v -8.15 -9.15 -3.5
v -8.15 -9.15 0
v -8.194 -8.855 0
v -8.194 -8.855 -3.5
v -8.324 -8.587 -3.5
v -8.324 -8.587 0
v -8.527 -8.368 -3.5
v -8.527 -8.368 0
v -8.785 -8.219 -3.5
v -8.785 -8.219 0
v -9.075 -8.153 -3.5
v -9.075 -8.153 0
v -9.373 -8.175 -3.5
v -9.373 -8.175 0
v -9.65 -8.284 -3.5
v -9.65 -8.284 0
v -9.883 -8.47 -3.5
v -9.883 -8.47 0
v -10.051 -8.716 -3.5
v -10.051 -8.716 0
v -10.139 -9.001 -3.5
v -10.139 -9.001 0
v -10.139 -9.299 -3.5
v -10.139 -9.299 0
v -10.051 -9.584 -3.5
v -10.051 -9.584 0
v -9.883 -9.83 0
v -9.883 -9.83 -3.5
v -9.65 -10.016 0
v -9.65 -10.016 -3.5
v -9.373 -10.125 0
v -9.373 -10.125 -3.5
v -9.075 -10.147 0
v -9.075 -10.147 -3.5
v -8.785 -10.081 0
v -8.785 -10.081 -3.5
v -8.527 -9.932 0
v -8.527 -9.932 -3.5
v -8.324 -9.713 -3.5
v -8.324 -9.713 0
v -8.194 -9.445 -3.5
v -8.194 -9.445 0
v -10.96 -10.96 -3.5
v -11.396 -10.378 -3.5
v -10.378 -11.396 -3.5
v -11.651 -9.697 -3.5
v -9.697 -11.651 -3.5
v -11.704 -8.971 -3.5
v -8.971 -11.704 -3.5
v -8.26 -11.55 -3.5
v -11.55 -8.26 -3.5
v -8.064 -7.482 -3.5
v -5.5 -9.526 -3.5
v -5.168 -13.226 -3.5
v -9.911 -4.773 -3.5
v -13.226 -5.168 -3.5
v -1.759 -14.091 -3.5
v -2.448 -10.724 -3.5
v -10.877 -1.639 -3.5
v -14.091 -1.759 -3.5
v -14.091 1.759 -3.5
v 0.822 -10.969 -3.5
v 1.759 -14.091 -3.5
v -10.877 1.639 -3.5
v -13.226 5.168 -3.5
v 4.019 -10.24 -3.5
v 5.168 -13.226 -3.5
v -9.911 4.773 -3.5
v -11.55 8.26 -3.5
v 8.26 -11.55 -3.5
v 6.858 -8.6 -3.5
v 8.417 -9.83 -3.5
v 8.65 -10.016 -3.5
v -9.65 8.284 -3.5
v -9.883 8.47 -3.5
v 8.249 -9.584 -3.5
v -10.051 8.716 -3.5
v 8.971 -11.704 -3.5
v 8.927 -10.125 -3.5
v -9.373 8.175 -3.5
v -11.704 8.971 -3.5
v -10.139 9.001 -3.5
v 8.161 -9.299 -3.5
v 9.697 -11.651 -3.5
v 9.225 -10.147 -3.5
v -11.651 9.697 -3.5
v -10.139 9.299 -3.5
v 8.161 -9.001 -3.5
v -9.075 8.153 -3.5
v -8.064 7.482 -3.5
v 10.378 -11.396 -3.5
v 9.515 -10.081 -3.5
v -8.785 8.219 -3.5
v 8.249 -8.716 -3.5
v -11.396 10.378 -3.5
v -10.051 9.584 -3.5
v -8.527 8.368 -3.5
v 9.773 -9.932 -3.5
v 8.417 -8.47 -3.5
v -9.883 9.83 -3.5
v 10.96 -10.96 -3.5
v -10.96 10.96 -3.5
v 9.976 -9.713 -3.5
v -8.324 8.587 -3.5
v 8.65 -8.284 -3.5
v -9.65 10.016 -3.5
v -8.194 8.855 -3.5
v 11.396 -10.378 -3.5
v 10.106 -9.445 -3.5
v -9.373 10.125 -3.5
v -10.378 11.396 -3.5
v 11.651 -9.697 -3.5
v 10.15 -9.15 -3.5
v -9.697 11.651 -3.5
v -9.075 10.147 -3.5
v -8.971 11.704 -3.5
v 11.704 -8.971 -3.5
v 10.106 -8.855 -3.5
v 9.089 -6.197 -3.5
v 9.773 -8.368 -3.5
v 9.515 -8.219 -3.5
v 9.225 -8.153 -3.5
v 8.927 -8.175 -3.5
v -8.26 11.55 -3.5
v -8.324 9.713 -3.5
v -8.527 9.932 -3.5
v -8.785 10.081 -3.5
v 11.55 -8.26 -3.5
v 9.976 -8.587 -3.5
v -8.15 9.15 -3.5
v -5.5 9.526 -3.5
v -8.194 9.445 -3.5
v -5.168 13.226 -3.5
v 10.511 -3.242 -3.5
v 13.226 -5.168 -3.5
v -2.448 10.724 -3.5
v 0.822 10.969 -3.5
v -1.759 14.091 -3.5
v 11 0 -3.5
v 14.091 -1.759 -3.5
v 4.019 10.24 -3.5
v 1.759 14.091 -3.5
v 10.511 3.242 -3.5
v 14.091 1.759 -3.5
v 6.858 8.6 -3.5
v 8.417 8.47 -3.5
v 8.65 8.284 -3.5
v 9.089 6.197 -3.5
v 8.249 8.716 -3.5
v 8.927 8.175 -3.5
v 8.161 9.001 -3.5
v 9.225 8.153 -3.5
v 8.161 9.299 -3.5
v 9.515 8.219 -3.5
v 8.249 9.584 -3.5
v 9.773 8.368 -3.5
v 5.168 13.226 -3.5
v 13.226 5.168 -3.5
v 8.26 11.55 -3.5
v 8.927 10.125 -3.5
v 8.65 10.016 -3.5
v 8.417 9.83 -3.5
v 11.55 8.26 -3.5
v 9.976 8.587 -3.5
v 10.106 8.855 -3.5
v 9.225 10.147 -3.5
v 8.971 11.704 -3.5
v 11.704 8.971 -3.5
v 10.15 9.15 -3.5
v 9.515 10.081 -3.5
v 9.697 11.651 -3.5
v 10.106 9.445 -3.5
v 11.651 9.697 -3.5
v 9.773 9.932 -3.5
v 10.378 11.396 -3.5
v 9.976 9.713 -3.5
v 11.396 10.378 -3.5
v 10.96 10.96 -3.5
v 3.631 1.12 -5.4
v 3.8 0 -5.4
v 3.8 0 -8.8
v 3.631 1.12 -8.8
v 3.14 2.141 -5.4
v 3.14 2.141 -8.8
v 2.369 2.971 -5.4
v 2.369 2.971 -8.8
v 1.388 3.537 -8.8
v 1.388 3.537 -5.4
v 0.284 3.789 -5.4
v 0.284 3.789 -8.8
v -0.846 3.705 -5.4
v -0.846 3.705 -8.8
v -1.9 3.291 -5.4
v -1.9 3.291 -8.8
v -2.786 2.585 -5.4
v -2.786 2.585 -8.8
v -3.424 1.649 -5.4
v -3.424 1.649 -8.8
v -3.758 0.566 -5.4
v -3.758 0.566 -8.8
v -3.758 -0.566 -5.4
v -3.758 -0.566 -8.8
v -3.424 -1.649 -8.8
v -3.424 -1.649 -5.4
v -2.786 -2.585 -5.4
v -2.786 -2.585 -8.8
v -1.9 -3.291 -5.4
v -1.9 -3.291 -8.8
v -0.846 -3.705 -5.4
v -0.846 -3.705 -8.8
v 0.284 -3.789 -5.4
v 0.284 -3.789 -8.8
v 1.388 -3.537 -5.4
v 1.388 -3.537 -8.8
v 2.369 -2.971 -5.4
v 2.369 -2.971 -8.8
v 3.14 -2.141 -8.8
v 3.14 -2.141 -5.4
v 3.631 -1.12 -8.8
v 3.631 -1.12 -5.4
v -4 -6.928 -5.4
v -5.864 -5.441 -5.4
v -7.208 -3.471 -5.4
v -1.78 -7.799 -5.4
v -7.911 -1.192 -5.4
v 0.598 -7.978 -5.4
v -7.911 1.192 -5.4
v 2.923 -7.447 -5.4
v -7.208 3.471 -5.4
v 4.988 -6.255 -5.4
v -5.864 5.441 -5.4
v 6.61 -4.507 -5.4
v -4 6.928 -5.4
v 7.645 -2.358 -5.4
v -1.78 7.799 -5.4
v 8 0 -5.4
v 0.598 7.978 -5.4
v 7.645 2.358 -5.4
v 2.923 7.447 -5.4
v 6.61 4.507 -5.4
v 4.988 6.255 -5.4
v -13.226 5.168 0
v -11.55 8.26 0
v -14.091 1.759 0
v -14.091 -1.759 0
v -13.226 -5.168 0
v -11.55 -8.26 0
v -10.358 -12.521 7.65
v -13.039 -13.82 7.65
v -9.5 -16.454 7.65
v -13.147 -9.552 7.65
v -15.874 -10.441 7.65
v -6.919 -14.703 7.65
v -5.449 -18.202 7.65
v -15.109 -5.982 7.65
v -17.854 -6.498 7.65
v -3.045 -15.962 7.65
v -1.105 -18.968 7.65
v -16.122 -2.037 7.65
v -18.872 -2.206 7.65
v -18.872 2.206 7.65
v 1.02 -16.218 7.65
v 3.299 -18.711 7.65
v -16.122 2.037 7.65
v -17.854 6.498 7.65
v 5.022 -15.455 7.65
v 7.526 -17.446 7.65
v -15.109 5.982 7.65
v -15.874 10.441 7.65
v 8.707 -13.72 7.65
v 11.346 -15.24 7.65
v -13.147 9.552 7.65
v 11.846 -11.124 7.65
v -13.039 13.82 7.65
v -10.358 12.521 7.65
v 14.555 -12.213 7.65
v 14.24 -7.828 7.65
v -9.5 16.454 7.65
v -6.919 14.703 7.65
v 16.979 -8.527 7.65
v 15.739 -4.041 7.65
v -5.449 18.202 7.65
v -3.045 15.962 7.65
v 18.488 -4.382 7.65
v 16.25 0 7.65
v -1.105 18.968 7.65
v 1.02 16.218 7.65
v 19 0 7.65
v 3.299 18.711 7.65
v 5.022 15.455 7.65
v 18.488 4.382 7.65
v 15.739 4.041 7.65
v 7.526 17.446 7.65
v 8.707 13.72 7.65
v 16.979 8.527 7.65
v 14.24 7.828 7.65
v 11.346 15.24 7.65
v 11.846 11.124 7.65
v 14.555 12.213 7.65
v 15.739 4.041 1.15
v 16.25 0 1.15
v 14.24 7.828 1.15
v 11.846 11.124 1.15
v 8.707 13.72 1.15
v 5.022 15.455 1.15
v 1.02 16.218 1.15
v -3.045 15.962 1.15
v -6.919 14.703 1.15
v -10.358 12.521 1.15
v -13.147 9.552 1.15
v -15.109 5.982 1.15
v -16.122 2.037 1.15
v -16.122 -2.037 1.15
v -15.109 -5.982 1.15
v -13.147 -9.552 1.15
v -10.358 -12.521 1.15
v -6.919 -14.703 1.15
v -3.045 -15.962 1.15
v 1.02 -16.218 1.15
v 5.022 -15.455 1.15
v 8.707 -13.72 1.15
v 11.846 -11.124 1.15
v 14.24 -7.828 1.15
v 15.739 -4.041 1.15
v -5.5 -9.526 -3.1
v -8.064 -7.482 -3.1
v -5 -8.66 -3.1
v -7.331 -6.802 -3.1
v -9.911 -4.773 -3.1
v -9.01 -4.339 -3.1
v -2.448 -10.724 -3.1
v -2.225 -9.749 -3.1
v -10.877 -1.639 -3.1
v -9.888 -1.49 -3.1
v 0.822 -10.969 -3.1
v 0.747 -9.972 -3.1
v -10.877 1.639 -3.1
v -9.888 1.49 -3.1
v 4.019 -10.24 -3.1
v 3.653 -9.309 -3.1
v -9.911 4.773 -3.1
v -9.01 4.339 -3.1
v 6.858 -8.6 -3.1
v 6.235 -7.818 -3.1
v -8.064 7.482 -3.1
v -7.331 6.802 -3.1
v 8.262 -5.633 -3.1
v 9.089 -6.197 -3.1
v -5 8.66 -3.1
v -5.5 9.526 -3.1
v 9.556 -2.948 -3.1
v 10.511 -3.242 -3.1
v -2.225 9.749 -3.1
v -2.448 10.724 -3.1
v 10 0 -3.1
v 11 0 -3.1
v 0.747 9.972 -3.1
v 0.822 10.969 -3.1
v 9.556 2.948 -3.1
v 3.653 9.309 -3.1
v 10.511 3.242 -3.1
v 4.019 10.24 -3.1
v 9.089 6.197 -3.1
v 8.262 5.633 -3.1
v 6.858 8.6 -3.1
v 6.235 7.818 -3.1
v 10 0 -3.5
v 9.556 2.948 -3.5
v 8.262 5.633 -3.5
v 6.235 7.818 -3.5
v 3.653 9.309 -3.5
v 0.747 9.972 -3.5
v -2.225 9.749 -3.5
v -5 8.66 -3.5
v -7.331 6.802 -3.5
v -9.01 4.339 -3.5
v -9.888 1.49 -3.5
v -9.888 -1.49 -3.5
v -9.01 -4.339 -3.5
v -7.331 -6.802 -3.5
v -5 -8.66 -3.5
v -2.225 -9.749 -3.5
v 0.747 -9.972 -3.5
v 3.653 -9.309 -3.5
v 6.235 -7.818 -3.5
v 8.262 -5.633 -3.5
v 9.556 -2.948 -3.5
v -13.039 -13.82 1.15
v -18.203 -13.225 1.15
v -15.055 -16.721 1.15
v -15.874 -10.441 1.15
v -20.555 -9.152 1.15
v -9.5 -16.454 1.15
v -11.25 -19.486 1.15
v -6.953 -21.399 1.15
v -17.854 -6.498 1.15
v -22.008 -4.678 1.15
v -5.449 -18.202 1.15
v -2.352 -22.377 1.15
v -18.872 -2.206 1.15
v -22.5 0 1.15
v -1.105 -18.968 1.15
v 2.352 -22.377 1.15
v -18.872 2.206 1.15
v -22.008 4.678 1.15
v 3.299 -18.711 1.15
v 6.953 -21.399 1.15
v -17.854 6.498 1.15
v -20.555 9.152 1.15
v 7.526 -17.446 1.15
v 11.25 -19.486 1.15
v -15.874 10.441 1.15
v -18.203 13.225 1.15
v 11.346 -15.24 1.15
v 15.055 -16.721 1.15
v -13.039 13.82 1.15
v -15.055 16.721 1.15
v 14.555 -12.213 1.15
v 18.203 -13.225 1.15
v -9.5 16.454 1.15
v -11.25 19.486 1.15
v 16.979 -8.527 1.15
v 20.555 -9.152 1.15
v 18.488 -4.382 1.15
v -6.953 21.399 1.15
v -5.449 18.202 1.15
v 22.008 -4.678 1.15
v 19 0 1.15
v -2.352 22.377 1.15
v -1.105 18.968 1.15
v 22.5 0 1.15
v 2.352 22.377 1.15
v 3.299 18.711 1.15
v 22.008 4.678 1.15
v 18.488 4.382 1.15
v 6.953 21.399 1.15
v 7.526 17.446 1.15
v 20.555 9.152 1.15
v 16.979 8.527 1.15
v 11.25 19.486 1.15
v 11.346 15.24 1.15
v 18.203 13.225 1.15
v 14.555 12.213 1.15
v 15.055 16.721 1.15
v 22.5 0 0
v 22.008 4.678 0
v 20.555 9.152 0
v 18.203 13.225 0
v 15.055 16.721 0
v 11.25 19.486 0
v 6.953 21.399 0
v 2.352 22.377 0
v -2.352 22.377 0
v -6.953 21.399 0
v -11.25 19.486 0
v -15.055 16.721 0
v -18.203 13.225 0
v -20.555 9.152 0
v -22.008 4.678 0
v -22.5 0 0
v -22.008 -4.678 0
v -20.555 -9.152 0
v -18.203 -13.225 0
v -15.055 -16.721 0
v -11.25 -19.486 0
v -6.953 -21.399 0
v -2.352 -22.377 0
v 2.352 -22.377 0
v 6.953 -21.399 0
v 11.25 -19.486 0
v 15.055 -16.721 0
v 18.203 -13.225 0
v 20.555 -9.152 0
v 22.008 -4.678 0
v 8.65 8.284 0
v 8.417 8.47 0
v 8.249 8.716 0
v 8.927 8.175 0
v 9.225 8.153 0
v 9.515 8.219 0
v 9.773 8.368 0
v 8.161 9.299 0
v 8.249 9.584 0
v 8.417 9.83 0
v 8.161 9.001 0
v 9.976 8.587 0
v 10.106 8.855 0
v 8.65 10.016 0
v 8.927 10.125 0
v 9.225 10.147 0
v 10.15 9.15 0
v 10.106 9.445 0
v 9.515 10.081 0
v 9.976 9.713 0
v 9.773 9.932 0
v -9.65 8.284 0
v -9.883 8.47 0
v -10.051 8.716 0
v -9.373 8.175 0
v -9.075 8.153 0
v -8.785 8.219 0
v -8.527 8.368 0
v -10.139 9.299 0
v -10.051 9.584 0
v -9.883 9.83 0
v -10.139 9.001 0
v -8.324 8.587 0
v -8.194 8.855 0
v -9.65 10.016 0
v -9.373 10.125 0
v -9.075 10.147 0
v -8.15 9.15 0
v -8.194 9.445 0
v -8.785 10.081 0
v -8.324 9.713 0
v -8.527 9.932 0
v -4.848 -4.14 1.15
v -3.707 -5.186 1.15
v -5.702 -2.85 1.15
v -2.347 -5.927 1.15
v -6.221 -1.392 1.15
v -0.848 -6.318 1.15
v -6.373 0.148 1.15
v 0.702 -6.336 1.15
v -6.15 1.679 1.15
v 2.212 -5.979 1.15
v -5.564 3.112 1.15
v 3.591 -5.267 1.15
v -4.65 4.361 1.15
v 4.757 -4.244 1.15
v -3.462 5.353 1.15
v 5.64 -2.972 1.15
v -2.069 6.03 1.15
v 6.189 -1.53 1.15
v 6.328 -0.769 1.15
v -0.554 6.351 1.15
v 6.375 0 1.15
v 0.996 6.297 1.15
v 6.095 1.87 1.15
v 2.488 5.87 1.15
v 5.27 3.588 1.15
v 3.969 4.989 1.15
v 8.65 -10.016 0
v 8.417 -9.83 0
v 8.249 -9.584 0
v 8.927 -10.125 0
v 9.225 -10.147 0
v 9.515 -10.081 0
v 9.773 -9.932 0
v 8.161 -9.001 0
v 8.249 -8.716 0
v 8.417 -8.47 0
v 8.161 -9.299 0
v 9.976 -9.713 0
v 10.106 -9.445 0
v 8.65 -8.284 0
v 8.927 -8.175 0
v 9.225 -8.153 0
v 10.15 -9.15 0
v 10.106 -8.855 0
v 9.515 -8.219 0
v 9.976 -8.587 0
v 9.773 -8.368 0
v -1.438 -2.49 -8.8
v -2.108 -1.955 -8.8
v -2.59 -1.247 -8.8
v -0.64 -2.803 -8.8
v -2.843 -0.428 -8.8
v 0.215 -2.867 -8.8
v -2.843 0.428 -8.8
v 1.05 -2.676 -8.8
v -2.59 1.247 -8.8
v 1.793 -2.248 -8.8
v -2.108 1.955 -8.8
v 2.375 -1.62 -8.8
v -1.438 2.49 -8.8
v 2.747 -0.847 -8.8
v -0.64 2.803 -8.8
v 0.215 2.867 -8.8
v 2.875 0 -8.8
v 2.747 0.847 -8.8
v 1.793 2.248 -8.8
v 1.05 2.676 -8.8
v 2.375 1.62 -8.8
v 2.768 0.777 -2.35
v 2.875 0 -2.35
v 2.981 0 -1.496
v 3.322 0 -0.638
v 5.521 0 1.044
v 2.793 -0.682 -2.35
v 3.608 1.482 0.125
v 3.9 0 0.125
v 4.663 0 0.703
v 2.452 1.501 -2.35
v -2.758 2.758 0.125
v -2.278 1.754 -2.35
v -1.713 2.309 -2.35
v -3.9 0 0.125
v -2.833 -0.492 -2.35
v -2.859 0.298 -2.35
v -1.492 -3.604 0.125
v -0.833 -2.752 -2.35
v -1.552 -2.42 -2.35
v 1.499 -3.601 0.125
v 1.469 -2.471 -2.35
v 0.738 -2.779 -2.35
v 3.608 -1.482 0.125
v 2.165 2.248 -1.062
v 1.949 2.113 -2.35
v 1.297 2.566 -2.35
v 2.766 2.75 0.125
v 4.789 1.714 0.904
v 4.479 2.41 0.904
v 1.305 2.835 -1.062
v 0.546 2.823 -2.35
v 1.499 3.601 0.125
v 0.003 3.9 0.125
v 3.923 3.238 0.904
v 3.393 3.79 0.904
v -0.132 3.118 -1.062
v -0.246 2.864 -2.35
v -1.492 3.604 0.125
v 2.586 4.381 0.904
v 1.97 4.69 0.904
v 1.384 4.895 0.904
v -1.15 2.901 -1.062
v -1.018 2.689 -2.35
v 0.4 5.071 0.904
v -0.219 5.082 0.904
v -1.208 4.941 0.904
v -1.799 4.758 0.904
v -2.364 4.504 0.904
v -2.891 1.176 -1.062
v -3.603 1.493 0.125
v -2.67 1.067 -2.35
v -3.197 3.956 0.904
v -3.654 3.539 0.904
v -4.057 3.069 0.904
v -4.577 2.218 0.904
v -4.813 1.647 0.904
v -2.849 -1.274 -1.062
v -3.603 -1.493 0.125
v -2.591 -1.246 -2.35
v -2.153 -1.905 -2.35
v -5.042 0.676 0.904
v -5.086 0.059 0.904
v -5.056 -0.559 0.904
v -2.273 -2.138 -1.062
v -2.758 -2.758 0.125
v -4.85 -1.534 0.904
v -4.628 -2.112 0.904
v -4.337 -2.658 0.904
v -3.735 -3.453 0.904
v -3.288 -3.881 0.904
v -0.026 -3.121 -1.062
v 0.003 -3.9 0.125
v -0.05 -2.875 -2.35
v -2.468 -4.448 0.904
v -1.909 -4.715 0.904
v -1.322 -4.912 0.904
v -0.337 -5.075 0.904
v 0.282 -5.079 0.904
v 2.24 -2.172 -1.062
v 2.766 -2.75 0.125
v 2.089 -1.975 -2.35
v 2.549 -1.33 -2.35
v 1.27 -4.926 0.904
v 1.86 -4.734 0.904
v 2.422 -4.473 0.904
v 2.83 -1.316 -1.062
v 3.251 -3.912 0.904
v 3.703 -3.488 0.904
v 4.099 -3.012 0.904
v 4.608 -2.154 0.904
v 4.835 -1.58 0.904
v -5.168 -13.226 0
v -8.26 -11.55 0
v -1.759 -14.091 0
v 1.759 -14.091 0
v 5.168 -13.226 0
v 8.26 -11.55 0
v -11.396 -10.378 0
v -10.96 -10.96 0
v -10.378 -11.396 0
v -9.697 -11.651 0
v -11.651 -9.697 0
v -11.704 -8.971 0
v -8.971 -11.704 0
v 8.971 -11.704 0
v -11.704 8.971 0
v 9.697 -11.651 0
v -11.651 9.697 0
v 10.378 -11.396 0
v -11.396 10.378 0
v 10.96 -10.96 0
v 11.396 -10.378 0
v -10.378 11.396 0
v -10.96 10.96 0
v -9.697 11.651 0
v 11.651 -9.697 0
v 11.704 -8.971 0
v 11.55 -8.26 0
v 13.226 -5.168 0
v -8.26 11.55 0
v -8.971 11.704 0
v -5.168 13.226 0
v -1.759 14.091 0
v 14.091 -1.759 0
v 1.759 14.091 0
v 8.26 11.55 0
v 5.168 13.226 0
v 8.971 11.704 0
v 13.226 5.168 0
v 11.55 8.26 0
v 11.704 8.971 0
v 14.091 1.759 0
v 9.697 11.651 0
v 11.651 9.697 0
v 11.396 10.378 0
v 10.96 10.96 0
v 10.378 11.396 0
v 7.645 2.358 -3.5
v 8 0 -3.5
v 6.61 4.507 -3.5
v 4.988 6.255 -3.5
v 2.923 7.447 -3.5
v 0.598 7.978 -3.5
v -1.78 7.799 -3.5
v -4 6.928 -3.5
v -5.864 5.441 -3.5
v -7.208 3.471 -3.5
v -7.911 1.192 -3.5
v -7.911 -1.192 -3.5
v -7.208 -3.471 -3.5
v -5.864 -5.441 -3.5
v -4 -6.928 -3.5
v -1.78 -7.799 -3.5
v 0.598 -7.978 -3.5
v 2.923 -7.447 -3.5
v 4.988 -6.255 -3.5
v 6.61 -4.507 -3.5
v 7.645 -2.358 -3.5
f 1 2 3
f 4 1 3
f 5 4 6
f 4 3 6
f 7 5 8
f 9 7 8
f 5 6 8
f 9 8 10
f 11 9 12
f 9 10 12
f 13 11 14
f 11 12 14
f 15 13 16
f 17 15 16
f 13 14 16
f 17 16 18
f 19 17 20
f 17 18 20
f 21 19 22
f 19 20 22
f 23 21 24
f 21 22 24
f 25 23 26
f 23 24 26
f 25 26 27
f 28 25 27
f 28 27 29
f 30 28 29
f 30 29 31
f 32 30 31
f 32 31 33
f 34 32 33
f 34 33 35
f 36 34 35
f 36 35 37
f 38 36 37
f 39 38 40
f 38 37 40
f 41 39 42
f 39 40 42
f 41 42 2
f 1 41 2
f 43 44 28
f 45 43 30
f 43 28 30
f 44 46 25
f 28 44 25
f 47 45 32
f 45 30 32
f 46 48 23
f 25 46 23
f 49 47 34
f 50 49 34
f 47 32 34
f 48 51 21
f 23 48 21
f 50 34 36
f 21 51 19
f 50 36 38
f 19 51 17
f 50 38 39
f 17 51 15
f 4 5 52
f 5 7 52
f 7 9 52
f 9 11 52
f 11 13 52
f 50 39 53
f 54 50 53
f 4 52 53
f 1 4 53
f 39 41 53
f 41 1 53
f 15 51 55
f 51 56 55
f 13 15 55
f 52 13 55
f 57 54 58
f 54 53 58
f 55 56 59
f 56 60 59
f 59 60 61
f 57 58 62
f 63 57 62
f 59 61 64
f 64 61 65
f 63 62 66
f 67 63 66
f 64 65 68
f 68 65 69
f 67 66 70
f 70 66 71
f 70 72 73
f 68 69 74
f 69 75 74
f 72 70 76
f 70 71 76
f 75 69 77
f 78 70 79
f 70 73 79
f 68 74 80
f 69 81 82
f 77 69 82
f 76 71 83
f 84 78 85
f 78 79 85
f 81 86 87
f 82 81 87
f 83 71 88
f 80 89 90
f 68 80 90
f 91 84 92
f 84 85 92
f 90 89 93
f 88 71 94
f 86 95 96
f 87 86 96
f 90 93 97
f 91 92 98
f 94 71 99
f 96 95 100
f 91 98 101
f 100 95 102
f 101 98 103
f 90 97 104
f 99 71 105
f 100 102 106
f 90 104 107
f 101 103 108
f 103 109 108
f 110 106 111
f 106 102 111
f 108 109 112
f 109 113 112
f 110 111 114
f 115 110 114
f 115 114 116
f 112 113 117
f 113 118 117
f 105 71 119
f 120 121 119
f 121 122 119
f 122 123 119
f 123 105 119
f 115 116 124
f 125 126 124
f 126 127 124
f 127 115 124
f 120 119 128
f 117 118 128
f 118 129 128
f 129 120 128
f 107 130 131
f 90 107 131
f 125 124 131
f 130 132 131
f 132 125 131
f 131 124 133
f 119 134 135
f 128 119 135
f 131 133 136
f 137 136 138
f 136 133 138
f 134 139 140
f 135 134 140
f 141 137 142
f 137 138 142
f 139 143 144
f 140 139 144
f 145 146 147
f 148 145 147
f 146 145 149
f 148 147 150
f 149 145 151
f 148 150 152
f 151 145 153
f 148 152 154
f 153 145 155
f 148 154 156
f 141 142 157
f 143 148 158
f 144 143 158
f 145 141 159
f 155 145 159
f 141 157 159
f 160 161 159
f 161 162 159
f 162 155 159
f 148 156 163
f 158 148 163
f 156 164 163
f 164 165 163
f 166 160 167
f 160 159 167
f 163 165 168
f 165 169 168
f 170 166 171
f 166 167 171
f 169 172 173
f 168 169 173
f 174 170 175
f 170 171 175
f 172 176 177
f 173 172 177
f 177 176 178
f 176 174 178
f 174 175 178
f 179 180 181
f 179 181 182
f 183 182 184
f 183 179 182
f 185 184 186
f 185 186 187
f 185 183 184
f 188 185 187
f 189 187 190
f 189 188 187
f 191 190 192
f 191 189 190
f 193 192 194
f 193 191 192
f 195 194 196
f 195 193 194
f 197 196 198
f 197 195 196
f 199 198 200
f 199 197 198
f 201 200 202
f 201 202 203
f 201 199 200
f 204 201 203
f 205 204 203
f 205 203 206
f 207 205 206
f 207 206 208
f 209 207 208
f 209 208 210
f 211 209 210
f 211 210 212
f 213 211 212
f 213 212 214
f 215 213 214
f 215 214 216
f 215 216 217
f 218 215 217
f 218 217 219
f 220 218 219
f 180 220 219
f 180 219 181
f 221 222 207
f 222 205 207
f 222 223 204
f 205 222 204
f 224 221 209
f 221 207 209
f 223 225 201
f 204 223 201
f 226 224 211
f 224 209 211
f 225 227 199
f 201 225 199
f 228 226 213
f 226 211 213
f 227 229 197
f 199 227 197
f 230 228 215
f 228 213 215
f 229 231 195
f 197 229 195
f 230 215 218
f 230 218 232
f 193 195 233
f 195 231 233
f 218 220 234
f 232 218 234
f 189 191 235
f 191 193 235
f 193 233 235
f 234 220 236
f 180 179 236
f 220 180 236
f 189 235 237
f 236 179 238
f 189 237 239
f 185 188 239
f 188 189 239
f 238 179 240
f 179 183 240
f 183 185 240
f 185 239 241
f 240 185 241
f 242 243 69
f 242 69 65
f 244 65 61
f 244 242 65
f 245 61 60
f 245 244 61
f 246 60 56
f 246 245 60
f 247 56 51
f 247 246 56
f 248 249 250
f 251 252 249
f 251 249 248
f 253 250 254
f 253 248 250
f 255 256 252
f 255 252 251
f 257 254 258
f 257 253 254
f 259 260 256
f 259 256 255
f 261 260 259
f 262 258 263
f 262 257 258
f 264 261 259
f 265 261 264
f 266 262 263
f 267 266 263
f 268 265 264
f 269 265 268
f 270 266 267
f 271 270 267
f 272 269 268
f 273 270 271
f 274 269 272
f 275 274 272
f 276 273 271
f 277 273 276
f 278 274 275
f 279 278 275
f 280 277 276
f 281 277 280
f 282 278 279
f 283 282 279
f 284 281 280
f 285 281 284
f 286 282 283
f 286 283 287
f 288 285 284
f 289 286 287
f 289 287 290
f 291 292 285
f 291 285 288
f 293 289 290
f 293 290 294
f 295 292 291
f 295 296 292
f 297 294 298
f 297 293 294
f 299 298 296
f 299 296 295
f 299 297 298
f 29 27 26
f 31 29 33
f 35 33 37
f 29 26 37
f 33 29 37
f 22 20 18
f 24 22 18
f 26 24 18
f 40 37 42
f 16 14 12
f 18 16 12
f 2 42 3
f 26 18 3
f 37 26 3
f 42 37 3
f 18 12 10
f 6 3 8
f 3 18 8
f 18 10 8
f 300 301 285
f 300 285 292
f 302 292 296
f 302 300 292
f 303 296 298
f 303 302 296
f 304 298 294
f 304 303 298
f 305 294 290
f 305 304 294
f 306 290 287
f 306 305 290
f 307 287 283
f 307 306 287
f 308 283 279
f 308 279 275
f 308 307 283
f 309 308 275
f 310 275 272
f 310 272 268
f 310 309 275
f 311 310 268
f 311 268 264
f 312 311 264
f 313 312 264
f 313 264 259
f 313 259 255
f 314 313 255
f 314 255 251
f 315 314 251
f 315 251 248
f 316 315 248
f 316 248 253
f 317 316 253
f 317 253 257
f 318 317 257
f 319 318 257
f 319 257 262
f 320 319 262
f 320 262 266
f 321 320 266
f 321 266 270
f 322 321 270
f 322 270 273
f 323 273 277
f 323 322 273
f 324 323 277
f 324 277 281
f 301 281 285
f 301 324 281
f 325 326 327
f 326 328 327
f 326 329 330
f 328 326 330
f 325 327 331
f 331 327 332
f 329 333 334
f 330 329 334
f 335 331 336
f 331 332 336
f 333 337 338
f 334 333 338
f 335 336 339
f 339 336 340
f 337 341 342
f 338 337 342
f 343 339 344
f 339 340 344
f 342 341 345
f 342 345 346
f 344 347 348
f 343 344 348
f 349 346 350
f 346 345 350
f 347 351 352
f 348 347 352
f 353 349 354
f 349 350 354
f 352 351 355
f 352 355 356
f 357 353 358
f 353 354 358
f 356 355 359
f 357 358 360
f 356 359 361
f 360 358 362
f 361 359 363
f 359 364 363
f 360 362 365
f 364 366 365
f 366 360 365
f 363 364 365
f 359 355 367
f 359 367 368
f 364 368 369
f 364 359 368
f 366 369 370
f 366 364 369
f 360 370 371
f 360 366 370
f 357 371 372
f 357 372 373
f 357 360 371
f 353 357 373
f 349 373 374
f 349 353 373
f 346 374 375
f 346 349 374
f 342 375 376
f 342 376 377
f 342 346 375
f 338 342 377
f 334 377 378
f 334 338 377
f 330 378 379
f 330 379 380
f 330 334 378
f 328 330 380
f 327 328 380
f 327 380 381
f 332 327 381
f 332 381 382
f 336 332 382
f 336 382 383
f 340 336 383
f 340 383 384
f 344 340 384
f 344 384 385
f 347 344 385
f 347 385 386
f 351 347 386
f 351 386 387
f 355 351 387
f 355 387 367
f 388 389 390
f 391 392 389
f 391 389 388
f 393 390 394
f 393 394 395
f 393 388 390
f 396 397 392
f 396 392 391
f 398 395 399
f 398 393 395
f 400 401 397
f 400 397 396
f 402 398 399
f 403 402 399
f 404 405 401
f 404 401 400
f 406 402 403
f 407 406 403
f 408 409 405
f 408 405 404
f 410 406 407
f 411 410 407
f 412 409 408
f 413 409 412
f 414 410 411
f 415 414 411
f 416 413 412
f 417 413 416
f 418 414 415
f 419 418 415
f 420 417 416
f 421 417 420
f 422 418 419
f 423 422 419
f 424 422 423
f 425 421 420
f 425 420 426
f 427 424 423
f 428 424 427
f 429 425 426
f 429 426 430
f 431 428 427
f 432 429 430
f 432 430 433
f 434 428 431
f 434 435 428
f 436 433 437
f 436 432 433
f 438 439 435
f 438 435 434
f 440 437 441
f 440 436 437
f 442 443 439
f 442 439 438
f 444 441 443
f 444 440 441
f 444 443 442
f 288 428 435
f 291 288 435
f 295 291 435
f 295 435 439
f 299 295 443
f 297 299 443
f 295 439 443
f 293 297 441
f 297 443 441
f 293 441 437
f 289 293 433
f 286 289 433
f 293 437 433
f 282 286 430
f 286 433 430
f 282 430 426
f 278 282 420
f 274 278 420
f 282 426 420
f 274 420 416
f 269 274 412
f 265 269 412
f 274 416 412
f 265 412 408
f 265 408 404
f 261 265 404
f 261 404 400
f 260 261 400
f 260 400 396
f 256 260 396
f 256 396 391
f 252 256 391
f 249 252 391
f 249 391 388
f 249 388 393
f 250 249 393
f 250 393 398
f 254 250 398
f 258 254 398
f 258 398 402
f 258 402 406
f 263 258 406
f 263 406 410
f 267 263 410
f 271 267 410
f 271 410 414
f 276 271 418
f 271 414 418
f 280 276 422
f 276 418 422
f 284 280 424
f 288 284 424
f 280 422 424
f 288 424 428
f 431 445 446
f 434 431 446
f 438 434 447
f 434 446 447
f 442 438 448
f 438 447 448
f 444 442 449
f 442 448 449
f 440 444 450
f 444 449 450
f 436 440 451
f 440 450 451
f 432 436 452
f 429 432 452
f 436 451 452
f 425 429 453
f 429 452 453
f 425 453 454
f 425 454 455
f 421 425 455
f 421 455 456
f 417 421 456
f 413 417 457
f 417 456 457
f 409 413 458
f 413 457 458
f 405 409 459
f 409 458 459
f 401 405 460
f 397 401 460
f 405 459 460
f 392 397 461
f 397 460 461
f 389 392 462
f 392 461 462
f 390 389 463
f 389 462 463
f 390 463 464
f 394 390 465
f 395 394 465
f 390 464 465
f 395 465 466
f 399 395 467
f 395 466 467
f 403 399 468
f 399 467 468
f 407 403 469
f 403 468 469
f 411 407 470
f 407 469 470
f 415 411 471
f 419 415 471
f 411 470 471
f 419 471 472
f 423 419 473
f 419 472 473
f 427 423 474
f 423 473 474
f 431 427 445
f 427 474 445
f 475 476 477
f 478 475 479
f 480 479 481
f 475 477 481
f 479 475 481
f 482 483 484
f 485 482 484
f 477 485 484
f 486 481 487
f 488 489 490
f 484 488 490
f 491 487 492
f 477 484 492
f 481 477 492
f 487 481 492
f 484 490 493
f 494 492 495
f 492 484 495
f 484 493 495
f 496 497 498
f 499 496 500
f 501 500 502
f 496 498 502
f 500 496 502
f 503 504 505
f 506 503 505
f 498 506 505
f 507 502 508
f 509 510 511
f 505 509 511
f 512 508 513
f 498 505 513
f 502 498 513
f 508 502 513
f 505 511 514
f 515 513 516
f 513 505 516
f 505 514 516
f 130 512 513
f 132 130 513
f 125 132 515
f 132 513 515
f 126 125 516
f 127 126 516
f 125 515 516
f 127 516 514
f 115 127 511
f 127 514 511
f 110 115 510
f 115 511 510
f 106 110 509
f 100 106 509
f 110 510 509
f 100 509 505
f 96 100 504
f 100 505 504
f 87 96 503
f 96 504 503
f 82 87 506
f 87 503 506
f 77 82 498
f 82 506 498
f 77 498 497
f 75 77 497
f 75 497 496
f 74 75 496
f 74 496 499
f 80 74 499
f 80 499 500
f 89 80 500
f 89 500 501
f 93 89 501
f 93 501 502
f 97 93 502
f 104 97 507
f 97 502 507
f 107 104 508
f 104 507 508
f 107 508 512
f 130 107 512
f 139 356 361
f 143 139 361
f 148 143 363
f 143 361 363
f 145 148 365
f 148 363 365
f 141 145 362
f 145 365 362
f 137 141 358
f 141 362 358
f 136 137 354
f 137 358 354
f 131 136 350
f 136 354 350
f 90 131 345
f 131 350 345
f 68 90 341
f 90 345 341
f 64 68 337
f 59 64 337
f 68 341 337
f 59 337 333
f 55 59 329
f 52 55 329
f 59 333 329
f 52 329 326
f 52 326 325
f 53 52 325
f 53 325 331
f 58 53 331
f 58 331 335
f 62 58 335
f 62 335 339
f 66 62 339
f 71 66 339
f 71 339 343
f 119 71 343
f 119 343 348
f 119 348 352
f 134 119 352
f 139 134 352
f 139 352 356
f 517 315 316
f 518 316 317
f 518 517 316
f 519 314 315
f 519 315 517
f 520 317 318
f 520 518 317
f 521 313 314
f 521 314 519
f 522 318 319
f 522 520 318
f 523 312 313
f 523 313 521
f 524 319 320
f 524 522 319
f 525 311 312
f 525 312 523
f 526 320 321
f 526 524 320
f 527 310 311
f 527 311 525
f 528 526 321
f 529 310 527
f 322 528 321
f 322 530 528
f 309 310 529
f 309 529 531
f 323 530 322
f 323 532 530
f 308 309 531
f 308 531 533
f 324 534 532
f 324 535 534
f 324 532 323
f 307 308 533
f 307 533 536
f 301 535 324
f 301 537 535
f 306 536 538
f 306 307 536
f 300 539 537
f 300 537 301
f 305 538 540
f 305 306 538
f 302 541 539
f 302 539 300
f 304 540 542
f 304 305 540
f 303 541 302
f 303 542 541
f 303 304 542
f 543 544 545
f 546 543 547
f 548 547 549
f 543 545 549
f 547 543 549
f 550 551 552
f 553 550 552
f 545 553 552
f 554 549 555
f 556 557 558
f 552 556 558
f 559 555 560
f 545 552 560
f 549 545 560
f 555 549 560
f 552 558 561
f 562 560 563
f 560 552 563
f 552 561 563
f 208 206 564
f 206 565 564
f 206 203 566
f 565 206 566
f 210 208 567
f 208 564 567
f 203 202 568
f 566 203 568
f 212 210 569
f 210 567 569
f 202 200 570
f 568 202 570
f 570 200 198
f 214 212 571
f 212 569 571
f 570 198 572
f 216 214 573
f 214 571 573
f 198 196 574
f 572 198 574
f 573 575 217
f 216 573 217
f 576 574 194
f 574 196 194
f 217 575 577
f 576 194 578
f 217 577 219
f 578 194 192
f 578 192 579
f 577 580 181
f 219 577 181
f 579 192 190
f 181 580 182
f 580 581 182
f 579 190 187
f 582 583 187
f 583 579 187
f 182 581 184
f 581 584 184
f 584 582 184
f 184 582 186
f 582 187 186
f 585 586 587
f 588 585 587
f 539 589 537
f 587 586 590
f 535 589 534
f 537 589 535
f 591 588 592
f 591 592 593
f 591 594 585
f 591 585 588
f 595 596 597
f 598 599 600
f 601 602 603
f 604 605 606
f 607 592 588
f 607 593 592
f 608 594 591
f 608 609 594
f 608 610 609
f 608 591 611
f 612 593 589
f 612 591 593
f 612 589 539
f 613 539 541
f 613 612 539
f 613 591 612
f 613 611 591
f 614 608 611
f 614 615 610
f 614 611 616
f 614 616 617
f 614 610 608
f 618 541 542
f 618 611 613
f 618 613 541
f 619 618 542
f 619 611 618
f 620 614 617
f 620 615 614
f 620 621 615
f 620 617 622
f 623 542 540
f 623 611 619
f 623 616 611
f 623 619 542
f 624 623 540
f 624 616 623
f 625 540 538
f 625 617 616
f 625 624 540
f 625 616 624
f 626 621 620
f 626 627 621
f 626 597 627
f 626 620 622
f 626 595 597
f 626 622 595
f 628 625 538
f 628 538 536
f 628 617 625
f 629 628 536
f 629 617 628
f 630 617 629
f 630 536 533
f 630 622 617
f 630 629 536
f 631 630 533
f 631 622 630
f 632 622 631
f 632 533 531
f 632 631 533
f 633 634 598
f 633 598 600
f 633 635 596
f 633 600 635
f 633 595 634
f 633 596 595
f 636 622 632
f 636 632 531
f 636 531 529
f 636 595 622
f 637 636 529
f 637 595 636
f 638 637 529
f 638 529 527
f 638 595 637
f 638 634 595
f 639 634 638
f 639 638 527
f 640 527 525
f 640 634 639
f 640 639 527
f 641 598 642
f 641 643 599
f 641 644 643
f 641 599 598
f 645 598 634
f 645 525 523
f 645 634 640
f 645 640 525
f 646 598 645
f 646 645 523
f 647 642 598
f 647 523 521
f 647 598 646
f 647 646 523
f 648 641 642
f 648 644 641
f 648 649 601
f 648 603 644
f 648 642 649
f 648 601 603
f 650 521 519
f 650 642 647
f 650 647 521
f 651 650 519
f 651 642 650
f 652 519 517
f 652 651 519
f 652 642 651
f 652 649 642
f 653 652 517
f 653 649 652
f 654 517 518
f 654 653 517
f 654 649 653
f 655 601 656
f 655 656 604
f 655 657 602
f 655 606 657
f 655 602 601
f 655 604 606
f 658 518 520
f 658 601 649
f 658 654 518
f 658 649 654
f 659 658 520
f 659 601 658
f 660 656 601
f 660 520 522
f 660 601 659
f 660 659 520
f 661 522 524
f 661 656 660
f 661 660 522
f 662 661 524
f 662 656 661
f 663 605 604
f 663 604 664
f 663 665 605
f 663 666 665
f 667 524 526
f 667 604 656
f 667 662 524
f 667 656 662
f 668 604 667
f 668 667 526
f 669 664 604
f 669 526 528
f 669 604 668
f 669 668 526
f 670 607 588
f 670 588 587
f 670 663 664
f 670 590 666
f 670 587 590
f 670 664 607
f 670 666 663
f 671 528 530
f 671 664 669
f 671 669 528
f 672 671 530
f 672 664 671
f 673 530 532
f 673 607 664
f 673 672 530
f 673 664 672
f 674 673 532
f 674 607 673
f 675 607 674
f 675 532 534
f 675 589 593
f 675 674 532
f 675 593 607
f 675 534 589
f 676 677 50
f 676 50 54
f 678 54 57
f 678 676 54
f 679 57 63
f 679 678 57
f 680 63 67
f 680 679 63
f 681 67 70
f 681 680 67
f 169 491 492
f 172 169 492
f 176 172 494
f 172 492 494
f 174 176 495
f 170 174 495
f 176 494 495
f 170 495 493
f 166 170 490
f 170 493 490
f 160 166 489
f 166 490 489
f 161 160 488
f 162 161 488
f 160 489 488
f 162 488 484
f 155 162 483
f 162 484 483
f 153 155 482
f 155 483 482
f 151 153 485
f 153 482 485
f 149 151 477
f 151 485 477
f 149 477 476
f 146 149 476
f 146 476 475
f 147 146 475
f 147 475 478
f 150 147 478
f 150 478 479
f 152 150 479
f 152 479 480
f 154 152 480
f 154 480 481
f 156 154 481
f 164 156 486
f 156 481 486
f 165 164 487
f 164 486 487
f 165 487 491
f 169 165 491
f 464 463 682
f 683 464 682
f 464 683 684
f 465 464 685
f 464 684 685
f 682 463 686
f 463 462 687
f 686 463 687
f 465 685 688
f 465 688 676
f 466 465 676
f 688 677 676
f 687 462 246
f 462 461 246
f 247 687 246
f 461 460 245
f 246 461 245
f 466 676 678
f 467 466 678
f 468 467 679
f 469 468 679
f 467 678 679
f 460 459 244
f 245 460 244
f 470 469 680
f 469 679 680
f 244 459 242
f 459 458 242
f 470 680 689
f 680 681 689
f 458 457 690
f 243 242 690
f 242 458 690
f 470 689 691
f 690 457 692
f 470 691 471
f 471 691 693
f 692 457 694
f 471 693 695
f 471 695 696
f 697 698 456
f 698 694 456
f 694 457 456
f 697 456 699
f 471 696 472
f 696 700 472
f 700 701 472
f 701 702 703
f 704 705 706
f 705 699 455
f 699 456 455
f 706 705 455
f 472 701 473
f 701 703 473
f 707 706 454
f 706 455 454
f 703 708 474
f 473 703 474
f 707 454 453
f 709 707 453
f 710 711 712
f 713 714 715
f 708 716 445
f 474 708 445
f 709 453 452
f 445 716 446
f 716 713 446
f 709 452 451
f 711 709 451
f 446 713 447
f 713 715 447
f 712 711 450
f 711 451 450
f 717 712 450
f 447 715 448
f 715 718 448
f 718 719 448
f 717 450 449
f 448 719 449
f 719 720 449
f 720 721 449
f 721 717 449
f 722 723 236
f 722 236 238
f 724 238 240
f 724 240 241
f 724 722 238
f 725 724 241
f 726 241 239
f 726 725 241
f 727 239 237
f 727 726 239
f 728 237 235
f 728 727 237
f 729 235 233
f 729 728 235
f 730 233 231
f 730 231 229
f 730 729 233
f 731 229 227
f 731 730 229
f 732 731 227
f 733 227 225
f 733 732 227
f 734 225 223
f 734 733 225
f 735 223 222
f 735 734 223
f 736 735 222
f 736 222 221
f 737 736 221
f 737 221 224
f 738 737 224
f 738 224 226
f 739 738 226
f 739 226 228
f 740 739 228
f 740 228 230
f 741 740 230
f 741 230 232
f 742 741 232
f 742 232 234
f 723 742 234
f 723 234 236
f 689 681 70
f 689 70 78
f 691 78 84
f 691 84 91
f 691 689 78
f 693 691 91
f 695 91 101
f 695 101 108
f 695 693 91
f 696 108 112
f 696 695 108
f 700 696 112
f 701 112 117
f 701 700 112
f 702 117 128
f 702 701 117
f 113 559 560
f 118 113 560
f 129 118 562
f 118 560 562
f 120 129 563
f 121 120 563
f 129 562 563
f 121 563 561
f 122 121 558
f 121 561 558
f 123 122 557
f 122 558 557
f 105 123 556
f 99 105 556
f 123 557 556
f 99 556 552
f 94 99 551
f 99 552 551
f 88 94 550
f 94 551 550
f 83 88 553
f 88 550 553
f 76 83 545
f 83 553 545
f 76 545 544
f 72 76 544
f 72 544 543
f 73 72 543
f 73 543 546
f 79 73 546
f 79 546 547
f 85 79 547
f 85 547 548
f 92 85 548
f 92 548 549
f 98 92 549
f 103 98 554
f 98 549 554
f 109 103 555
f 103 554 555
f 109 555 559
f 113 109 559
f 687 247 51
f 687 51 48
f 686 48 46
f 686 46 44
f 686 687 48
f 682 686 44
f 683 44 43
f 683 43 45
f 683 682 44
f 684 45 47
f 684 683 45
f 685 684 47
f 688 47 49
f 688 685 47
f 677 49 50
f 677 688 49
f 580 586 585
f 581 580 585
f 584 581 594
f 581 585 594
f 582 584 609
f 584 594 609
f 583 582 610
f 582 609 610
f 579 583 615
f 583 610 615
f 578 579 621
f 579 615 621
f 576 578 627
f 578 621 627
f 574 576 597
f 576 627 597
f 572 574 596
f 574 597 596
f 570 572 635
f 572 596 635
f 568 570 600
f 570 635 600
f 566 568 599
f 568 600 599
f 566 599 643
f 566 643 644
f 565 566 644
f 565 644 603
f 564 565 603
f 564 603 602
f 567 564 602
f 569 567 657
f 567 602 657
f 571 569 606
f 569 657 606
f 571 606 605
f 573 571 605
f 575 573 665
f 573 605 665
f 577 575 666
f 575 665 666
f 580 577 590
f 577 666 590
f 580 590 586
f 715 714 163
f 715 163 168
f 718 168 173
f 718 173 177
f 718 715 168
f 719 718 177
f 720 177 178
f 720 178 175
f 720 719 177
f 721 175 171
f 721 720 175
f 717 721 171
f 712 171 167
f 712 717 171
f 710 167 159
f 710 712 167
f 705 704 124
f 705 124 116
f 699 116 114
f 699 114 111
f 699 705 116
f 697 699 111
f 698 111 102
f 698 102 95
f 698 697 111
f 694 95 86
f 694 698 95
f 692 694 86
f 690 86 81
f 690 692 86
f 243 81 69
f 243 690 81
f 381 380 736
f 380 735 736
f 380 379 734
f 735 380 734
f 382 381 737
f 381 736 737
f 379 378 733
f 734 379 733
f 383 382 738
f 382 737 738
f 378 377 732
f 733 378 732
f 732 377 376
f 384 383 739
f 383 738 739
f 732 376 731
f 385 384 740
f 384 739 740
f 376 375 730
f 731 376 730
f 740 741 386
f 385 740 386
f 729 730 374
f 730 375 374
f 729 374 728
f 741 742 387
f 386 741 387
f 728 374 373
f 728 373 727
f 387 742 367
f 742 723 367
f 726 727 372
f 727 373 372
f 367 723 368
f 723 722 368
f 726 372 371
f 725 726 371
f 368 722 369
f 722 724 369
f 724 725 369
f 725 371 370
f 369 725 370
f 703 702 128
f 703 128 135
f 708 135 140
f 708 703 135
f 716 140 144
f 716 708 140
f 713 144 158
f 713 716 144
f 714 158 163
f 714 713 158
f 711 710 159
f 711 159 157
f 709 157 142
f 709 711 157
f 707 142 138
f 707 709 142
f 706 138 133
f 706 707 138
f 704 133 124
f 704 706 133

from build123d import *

# Parameters (mm, degrees)
F0_R     = 22.5
F0_R_2   = 19
F0_R_3   = 16.25
F0_R_4   = 1
F0_R_5   = 11
F0_R_6   = 10
F0_R_7   = 8
F0_R_8   = 6.4
F0_R_9   = 3.8
F0_R_10  = 2.875
F1_DEPTH = 1.15
F2_DEPTH = 7.65
F3_DEPTH = 3.5
F4_DEPTH = 3.1
F5_DEPTH = 5.4
F6_DEPTH = 8.8
F7_R     = 3.5


with BuildPart() as f1:
    # F0 (on Top) → F1 (new body)
    with BuildSketch(Plane.XY):
        Circle(F0_R)
        Circle(F0_R_2, mode=Mode.SUBTRACT)
        Circle(F0_R_2)
        Circle(F0_R_3, mode=Mode.SUBTRACT)
        Circle(F0_R_3)
        with BuildLine():
            ThreePointArc((8.26016, -11.550314), (0, -14.2), (-8.26016, -11.550314))
            ThreePointArc((-8.26016, -11.550314), (-10.960155, -10.960155), (-11.550314, -8.26016))
            ThreePointArc((-11.550314, -8.26016), (-14.2, 0), (-11.550314, 8.26016))
            ThreePointArc((-11.550314, 8.26016), (-10.960155, 10.960155), (-8.26016, 11.550314))
            ThreePointArc((-8.26016, 11.550314), (0, 14.2), (8.26016, 11.550314))
            ThreePointArc((8.26016, 11.550314), (10.960155, 10.960155), (11.550314, 8.26016))
            ThreePointArc((11.550314, 8.26016), (14.2, 0), (11.550314, -8.26016))
            ThreePointArc((11.550314, -8.26016), (10.960155, -10.960155), (8.26016, -11.550314))
        make_face(mode=Mode.SUBTRACT)
        with BuildLine():
            ThreePointArc((-11.550314, -8.26016), (-10.960155, -10.960155), (-8.26016, -11.550314))
            ThreePointArc((-8.26016, -11.550314), (0, -14.2), (8.26016, -11.550314))
            ThreePointArc((8.26016, -11.550314), (10.960155, -10.960155), (11.550314, -8.26016))
            ThreePointArc((11.550314, -8.26016), (14.2, 0), (11.550314, 8.26016))
            ThreePointArc((11.550314, 8.26016), (10.960155, 10.960155), (8.26016, 11.550314))
            ThreePointArc((8.26016, 11.550314), (0, 14.2), (-8.26016, 11.550314))
            ThreePointArc((-8.26016, 11.550314), (-10.960155, 10.960155), (-11.550314, 8.26016))
            ThreePointArc((-11.550314, 8.26016), (-14.2, 0), (-11.550314, -8.26016))
        make_face()
        with Locations((-9.15, -9.15)):
            Circle(F0_R_4, mode=Mode.SUBTRACT)
        with Locations((9.15, -9.15)):
            Circle(F0_R_4, mode=Mode.SUBTRACT)
        with Locations((-9.15, 9.15)):
            Circle(F0_R_4, mode=Mode.SUBTRACT)
        Circle(F0_R_5, mode=Mode.SUBTRACT)
        with Locations((9.15, 9.15)):
            Circle(F0_R_4, mode=Mode.SUBTRACT)
        Circle(F0_R_5)
        Circle(F0_R_6, mode=Mode.SUBTRACT)
        Circle(F0_R_6)
        Circle(F0_R_7, mode=Mode.SUBTRACT)
        Circle(F0_R_7)
        Circle(F0_R_8, mode=Mode.SUBTRACT)
        with Locations((-9.15, 9.15)):
            Circle(F0_R_4)
        with Locations((9.15, 9.15)):
            Circle(F0_R_4)
        with Locations((9.15, -9.15)):
            Circle(F0_R_4)
        with Locations((-9.15, -9.15)):
            Circle(F0_R_4)
        Circle(F0_R_8)
        Circle(F0_R_9, mode=Mode.SUBTRACT)
        Circle(F0_R_9)
        Circle(F0_R_10, mode=Mode.SUBTRACT)
    extrude(amount=F1_DEPTH)

    # F0 (on Top) → F2 (join)
    with BuildSketch(Plane.XY):
        Circle(F0_R_2)
        Circle(F0_R_3, mode=Mode.SUBTRACT)
    extrude(amount=F2_DEPTH)

    # F0 (on Top) → F3 (join)
    with BuildSketch(Plane.XY):
        with BuildLine():
            ThreePointArc((-11.550314, -8.26016), (-10.960155, -10.960155), (-8.26016, -11.550314))
            ThreePointArc((-8.26016, -11.550314), (0, -14.2), (8.26016, -11.550314))
            ThreePointArc((8.26016, -11.550314), (10.960155, -10.960155), (11.550314, -8.26016))
            ThreePointArc((11.550314, -8.26016), (14.2, 0), (11.550314, 8.26016))
            ThreePointArc((11.550314, 8.26016), (10.960155, 10.960155), (8.26016, 11.550314))
            ThreePointArc((8.26016, 11.550314), (0, 14.2), (-8.26016, 11.550314))
            ThreePointArc((-8.26016, 11.550314), (-10.960155, 10.960155), (-11.550314, 8.26016))
            ThreePointArc((-11.550314, 8.26016), (-14.2, 0), (-11.550314, -8.26016))
        make_face()
        with Locations((-9.15, -9.15)):
            Circle(F0_R_4, mode=Mode.SUBTRACT)
        with Locations((9.15, -9.15)):
            Circle(F0_R_4, mode=Mode.SUBTRACT)
        with Locations((-9.15, 9.15)):
            Circle(F0_R_4, mode=Mode.SUBTRACT)
        Circle(F0_R_5, mode=Mode.SUBTRACT)
        with Locations((9.15, 9.15)):
            Circle(F0_R_4, mode=Mode.SUBTRACT)
        Circle(F0_R_6)
        Circle(F0_R_7, mode=Mode.SUBTRACT)
    extrude(amount=-F3_DEPTH)

    # F0 (on Top) → F4 (join)
    with BuildSketch(Plane.XY):
        Circle(F0_R_5)
        Circle(F0_R_6, mode=Mode.SUBTRACT)
    extrude(amount=-F4_DEPTH)

    # F0 (on Top) → F5 (join)
    with BuildSketch(Plane.XY):
        Circle(F0_R_7)
        Circle(F0_R_8, mode=Mode.SUBTRACT)
        Circle(F0_R_8)
        Circle(F0_R_9, mode=Mode.SUBTRACT)
    extrude(amount=-F5_DEPTH)

    # F0 (on Top) → F6 (join)
    with BuildSketch(Plane.XY):
        Circle(F0_R_9)
        Circle(F0_R_10, mode=Mode.SUBTRACT)
    extrude(amount=-F6_DEPTH)

    # F7
    f7_edges = [f1.edges().sort_by_distance(p)[0] for p in [
        (-2.875, 0, 1.15),
    ]]
    fillet(f7_edges, radius=F7_R)


solid = f1.part
